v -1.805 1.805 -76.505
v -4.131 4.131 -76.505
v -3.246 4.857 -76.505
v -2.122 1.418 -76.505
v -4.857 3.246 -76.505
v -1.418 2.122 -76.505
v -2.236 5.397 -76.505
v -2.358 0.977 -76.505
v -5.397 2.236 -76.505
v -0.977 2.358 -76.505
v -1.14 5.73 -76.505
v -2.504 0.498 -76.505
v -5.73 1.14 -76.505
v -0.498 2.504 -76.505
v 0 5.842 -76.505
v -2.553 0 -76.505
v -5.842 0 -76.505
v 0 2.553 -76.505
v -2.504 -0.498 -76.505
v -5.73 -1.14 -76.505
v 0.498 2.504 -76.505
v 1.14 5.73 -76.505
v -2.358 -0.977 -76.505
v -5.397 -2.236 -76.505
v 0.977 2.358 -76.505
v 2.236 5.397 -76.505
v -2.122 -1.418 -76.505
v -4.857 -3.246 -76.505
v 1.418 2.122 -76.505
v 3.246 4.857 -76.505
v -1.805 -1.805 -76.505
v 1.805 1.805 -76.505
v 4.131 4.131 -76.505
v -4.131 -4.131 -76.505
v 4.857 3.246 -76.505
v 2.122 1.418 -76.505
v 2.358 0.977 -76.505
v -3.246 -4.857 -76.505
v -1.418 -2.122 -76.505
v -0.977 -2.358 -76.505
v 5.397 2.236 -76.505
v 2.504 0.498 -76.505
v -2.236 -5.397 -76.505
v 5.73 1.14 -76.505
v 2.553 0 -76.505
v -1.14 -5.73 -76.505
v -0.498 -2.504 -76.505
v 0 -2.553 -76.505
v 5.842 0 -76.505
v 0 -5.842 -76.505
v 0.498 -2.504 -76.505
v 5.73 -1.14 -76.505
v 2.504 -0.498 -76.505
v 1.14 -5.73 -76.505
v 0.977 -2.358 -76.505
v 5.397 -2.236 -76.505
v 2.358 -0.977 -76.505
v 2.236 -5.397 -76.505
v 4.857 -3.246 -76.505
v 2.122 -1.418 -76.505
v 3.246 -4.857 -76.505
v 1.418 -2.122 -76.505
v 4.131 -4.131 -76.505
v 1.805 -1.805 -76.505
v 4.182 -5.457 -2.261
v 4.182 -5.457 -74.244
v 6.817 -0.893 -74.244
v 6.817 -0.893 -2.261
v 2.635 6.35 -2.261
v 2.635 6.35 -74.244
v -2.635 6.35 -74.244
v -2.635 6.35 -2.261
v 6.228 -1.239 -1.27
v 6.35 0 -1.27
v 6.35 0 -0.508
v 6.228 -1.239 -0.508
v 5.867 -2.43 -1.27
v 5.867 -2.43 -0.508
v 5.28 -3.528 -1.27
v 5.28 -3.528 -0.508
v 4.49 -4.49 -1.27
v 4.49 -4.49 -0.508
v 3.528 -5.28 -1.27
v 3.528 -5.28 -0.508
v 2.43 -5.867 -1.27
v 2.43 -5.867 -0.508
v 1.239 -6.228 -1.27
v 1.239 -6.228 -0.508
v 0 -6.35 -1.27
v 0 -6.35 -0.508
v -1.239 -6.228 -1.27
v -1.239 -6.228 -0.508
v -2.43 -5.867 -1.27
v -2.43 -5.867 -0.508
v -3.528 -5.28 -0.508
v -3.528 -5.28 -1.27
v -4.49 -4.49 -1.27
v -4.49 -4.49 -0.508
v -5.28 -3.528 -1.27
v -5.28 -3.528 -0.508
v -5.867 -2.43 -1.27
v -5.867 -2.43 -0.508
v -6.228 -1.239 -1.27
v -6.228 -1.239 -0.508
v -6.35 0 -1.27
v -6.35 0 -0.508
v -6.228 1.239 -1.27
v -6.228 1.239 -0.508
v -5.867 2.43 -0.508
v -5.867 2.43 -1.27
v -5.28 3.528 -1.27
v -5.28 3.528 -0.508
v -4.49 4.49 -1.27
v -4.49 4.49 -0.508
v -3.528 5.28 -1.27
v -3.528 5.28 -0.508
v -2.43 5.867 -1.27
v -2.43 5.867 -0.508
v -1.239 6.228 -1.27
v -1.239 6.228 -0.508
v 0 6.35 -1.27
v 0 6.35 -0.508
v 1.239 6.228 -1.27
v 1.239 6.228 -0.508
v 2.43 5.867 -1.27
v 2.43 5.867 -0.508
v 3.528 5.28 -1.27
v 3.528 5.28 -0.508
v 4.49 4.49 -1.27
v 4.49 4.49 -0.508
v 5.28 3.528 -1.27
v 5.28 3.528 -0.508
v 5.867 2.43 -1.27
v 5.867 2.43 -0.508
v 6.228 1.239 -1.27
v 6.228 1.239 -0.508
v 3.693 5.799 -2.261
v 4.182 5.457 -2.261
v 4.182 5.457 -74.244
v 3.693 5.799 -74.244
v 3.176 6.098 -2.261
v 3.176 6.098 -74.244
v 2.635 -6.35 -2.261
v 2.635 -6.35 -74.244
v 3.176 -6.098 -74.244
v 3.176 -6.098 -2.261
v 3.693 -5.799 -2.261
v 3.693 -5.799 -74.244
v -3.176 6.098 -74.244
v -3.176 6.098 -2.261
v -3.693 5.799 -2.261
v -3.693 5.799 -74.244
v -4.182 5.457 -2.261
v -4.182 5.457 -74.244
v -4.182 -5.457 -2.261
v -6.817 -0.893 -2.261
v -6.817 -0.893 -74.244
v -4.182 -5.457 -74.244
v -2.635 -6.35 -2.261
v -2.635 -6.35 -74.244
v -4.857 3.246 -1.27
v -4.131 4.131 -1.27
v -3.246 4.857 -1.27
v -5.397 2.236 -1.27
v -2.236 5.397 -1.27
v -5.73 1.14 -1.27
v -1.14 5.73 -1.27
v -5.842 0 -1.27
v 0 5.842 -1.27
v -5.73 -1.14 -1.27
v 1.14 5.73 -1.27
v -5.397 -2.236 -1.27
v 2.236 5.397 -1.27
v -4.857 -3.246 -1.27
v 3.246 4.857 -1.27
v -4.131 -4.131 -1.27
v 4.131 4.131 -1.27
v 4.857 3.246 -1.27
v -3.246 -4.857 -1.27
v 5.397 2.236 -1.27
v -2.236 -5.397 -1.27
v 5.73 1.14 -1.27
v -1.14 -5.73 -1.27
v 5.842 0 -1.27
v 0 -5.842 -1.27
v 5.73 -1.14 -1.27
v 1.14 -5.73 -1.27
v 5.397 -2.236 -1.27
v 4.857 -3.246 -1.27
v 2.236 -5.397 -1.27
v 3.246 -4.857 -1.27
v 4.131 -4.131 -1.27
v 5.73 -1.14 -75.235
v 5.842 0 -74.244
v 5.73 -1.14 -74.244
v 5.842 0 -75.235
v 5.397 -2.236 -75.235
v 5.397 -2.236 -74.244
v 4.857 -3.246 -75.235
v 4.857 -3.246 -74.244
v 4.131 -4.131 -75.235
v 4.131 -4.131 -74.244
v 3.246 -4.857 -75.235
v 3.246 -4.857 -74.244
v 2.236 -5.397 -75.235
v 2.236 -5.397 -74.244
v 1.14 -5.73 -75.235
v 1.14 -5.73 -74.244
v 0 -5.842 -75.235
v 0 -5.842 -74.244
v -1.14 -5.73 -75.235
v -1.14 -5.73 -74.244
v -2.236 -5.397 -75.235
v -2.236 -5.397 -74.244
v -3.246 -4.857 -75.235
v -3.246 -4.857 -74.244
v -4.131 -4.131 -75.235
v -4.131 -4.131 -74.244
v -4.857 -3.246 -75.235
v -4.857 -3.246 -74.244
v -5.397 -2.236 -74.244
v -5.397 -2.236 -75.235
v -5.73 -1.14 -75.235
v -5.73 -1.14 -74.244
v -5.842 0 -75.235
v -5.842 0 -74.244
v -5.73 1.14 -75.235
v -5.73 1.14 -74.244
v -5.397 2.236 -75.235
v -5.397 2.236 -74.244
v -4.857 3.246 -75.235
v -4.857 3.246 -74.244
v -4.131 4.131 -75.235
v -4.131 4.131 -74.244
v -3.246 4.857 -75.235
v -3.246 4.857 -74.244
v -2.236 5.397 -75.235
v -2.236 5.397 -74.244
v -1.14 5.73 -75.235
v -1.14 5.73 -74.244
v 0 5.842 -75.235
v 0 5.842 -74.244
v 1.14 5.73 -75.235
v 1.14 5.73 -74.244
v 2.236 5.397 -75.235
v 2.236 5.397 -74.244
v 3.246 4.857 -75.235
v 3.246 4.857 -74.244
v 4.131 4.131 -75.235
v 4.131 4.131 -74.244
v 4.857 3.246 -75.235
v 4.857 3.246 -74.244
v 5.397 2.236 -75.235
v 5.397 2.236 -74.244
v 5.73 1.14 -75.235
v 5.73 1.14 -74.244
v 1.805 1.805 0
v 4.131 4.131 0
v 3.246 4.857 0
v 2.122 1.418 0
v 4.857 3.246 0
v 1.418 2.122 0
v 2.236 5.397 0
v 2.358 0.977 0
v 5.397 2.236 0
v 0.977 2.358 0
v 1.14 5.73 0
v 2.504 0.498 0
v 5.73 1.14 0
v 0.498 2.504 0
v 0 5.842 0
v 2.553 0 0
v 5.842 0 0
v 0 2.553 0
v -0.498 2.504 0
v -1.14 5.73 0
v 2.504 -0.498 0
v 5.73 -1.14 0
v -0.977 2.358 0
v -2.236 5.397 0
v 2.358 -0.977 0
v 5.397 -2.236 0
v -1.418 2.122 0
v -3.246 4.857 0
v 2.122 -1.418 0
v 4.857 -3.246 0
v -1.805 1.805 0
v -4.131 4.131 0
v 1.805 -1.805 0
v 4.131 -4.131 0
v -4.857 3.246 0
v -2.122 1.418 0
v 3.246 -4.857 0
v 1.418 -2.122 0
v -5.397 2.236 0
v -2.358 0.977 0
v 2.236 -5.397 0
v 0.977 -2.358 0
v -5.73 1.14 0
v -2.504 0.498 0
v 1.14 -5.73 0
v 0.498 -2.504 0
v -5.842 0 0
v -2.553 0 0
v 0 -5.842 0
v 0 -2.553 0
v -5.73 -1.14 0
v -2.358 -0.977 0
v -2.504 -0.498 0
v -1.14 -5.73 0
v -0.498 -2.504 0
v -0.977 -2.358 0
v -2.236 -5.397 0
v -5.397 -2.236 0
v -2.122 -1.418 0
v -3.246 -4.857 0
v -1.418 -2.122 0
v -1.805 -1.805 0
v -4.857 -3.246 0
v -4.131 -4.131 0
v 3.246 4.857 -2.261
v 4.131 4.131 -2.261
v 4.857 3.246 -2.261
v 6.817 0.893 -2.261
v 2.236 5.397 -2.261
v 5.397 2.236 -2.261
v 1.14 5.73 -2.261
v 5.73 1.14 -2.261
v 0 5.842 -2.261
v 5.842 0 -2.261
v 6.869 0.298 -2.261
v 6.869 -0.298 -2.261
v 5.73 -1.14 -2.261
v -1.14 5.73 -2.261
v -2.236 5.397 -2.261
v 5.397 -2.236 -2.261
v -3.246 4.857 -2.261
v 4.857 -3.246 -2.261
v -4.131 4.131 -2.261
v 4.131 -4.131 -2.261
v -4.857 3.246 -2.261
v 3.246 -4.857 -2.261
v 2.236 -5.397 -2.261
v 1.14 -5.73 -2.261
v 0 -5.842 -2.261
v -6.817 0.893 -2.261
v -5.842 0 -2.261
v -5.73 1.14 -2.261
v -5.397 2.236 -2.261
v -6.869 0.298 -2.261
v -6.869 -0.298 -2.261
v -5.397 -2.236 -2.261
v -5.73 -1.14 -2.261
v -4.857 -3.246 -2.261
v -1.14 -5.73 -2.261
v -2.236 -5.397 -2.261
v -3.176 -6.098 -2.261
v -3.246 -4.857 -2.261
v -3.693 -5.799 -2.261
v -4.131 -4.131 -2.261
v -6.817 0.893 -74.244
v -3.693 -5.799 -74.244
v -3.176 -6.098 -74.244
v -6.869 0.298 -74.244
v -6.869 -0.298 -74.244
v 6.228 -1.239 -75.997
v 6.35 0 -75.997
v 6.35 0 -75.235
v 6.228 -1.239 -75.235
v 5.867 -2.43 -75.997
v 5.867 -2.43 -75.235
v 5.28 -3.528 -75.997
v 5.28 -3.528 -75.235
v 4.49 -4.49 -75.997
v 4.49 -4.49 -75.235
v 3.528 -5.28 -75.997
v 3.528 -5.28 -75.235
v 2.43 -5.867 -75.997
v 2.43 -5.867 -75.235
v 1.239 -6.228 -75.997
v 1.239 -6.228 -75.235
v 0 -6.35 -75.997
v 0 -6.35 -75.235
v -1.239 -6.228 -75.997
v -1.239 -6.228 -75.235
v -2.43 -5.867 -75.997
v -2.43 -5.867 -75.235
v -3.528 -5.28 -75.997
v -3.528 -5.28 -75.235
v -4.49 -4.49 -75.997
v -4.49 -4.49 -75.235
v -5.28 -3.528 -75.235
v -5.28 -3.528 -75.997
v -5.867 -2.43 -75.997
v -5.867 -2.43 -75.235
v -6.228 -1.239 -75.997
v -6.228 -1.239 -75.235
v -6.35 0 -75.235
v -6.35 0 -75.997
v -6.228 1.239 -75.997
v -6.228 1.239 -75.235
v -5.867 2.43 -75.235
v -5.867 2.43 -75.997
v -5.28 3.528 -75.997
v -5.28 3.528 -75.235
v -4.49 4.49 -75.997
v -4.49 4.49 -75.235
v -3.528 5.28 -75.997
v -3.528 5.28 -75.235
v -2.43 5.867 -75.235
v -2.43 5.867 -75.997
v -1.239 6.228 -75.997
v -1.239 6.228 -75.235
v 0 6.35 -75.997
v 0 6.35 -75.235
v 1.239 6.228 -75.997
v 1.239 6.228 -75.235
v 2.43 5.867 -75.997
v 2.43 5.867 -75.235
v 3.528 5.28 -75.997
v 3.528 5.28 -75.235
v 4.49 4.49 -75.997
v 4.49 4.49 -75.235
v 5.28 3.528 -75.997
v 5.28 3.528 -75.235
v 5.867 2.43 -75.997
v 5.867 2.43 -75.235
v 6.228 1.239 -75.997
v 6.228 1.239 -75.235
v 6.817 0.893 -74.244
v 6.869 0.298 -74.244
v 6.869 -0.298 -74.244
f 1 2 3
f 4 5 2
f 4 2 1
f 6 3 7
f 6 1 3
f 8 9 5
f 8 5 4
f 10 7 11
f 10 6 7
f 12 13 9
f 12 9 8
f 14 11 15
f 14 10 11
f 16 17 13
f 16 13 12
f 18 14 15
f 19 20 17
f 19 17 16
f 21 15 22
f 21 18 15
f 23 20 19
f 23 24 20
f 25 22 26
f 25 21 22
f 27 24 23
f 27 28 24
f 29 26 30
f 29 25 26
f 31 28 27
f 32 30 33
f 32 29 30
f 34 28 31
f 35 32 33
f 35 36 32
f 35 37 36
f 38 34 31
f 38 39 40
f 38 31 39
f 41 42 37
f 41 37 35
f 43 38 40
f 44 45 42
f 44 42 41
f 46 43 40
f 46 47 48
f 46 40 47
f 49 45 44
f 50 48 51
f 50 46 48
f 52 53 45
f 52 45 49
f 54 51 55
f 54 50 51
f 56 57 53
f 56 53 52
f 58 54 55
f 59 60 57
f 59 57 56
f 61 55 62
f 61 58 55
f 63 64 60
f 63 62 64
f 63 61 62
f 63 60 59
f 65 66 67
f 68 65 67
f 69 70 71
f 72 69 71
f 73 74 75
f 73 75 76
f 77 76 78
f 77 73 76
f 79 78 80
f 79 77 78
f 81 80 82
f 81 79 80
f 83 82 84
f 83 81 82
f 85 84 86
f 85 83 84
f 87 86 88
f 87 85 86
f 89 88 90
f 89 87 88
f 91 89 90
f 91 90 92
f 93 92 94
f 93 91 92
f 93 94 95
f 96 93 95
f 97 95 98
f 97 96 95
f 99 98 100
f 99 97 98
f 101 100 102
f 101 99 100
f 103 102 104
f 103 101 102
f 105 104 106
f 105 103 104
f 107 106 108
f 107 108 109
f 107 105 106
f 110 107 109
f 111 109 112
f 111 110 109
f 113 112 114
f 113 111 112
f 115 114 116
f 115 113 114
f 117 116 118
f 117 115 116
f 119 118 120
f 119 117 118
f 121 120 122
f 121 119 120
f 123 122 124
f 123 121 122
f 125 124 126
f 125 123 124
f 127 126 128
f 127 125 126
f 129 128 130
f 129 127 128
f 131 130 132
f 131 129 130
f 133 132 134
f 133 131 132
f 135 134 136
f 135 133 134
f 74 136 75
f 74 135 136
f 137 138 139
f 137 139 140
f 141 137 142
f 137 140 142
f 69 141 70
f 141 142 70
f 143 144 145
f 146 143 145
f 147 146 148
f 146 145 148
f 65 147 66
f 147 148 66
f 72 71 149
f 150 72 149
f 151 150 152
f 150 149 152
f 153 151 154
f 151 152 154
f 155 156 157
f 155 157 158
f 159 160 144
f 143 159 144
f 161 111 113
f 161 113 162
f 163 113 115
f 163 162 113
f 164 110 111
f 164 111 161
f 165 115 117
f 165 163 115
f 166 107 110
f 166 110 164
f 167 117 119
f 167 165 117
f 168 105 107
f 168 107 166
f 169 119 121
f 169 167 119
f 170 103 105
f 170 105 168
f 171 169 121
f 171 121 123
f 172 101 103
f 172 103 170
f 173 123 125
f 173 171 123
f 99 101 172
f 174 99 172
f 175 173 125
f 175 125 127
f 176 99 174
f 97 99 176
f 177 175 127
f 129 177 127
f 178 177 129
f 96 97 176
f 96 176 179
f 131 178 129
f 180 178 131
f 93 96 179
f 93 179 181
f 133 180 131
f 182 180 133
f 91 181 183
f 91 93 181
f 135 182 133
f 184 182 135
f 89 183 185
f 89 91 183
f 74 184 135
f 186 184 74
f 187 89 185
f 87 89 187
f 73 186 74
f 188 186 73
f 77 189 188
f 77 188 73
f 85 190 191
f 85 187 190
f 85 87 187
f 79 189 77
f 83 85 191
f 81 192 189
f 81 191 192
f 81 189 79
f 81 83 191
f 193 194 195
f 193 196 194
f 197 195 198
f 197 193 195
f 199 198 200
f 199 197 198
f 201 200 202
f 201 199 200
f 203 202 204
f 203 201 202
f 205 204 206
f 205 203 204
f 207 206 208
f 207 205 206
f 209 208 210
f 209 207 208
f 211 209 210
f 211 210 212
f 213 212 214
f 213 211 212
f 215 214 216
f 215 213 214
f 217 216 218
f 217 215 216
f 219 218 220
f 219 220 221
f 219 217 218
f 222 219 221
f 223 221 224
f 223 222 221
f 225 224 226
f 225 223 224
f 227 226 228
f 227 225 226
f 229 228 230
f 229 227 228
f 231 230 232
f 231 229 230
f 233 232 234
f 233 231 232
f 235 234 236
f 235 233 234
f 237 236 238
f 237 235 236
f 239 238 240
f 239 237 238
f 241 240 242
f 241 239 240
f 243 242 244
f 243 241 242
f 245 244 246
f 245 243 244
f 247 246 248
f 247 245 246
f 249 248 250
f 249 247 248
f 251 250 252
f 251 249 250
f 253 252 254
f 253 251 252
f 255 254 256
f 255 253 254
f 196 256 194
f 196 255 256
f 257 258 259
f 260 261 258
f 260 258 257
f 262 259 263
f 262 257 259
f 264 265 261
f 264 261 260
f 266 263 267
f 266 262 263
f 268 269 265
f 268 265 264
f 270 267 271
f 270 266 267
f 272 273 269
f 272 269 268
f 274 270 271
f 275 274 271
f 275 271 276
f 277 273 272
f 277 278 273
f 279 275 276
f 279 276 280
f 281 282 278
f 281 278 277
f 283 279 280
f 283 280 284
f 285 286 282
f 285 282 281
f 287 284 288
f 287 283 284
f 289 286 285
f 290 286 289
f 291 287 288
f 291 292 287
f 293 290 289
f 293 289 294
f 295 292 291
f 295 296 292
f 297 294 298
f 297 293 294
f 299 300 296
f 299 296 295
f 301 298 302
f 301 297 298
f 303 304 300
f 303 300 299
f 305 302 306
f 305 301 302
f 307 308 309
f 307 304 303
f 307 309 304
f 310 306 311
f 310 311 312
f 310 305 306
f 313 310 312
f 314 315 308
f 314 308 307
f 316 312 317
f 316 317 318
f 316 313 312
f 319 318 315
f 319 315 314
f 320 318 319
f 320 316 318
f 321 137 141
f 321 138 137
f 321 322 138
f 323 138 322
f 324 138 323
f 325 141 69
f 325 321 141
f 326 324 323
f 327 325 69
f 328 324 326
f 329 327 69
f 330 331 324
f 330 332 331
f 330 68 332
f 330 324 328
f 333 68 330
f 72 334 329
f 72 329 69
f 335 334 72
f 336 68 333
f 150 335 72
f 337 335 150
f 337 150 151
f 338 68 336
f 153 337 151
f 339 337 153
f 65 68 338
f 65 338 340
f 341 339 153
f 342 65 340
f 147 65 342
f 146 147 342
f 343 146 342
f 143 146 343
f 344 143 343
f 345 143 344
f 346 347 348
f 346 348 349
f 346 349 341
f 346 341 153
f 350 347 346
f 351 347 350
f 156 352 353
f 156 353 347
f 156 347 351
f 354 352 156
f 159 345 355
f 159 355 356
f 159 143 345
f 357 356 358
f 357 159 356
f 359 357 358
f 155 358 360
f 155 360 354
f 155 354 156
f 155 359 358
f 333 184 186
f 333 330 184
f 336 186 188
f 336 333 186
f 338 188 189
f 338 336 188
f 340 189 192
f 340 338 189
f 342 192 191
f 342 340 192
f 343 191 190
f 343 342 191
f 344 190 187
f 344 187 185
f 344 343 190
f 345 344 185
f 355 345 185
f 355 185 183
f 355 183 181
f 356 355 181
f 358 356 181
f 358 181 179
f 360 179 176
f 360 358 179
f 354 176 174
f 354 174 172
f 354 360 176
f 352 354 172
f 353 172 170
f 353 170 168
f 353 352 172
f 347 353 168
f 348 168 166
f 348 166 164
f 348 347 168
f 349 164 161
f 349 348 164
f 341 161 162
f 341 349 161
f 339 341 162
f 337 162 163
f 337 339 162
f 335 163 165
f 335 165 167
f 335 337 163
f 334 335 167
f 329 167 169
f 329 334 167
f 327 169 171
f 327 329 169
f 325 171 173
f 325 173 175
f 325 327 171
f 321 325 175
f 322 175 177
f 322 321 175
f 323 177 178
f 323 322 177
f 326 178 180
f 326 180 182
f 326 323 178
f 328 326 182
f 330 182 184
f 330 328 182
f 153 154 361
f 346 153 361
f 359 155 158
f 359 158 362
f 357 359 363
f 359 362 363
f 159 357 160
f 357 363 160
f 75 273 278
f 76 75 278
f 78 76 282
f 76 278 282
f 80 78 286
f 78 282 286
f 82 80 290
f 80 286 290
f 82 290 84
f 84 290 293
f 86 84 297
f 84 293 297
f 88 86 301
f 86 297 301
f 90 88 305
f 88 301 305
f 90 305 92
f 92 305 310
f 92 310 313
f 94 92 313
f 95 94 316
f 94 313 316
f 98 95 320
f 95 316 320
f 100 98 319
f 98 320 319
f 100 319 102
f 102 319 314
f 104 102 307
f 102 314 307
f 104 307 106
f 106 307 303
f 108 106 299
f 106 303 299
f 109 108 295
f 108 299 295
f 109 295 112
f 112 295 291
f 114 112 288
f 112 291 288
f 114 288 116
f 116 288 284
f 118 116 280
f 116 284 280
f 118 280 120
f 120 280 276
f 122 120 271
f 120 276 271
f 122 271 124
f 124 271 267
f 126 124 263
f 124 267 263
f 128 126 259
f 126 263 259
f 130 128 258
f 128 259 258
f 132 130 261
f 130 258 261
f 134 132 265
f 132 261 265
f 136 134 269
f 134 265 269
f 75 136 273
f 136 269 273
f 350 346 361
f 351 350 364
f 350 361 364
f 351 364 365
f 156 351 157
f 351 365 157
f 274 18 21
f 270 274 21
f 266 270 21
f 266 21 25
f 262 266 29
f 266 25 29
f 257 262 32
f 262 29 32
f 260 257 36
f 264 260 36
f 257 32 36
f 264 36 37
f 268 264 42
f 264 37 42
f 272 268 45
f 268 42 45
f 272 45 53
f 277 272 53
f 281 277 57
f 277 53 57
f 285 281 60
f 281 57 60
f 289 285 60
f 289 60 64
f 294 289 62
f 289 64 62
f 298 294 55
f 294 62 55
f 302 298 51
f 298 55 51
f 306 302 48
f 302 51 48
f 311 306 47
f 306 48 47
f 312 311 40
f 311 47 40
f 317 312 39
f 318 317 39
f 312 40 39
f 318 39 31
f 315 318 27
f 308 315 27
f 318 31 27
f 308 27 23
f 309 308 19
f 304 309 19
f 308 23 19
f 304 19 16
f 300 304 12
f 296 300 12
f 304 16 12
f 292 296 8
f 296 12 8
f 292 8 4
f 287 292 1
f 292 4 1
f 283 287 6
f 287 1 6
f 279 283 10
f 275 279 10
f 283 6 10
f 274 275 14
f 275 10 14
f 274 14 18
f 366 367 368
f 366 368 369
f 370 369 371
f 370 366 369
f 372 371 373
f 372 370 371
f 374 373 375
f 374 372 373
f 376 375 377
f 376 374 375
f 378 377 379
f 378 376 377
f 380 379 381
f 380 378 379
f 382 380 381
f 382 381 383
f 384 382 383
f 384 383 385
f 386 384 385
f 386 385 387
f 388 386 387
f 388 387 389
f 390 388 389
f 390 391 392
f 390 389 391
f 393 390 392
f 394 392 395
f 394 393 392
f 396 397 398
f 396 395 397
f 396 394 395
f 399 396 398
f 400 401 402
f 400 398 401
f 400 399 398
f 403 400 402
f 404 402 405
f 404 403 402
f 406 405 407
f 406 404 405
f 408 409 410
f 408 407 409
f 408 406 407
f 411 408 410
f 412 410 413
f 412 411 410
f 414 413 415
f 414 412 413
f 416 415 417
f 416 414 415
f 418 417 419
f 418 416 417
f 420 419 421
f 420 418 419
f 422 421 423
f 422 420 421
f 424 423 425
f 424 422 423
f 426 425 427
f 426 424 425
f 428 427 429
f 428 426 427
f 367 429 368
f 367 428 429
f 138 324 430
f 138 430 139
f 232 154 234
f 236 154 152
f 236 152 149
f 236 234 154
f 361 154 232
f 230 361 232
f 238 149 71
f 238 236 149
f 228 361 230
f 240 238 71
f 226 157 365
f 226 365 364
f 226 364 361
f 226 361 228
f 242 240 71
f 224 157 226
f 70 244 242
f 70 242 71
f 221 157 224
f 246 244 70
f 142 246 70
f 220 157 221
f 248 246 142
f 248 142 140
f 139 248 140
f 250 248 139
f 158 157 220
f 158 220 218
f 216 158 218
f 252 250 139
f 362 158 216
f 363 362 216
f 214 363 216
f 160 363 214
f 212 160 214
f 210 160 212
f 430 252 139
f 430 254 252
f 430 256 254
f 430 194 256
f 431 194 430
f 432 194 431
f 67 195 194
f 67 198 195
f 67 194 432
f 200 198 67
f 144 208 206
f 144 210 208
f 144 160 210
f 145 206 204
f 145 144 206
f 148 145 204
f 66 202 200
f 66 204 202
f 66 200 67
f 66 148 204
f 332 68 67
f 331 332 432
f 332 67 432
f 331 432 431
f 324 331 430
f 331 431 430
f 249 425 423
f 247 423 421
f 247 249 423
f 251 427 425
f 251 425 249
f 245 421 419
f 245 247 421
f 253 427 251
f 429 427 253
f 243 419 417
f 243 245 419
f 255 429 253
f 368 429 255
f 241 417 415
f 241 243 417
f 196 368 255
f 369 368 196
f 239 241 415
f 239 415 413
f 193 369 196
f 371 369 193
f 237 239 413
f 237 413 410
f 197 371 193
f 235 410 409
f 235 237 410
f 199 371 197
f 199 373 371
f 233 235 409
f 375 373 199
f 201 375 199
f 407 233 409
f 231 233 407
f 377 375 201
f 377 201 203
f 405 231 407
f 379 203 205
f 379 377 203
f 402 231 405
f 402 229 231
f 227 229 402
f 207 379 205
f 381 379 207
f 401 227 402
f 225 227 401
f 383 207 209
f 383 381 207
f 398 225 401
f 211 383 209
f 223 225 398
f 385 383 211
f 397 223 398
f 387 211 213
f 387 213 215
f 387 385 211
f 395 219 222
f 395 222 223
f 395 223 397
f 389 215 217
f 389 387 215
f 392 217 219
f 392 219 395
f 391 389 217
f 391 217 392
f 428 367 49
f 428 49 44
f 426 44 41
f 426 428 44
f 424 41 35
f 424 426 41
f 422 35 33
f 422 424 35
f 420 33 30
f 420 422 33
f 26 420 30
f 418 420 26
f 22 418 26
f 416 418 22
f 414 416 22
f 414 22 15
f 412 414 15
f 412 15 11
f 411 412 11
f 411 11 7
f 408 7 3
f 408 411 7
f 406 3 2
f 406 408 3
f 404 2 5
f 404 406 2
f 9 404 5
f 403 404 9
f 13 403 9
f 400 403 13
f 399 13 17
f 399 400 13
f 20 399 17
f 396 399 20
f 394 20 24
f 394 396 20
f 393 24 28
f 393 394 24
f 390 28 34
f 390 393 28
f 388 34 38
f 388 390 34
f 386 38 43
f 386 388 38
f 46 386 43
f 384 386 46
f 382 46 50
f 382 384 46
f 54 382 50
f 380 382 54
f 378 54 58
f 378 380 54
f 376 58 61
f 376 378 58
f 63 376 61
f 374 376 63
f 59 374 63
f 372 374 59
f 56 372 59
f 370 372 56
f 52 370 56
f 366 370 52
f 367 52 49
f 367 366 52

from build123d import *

# Parameters (mm, degrees)
CUT_EXTRUDE1_START = -76.5048
SKETCH3_R          = 7.62
CUT_EXTRUDE1_DEPTH = 76.5048
SKETCH4_R          = 2.5527
CUT_EXTRUDE2_DEPTH = 76.5048
CHAMFER1_SIZE      = 0.508


with BuildPart() as part:
    # Sketch2 → Revolve1 (revolve)
    with BuildSketch(Plane(origin=(0, 0, 0), x_dir=(0, 0, -1), z_dir=(1, 0, 0)), mode=Mode.PRIVATE) as revolve1_sk:
        Polygon((1.27, 6.35), (1.27, 5.842), (2.2606, 5.842), (2.2606, 7.62), (74.2442, 7.62), (74.2442, 5.842), (75.2348, 5.842), (75.2348, 6.35), (76.5048, 6.35), (76.5048, 0), (0, 0), (0, 6.35), align=None)
    revolve(revolve1_sk.sketch.rotate(Axis((0, 0, 0), (0, 0, -1)), 90), axis=Axis((0, 0, 0), (0, 0, -1)))

    # Sketch3 → Cut-Extrude1 (cut)
    with BuildSketch(Plane.XY.offset(CUT_EXTRUDE1_START)):
        Circle(SKETCH3_R)
        with BuildLine():
            Line((6.816751826, 0.893039494), (4.181770802, 5.456960506))
            ThreePointArc((4.181770802, 5.456960506), (3.4375, 5.953924651), (2.634981025, 6.35))
            Line((2.634981025, 6.35), (-2.634981025, 6.35))
            ThreePointArc((-2.634981025, 6.35), (-3.4375, 5.953924651), (-4.181770802, 5.456960506))
            Line((-4.181770802, 5.456960506), (-6.816751826, 0.893039494))
            ThreePointArc((-6.816751826, 0.893039494), (-6.875, 0), (-6.816751826, -0.893039494))
            Line((-6.816751826, -0.893039494), (-4.181770802, -5.456960506))
            ThreePointArc((-4.181770802, -5.456960506), (-3.4375, -5.953924651), (-2.634981025, -6.35))
            Line((-2.634981025, -6.35), (2.634981025, -6.35))
            ThreePointArc((2.634981025, -6.35), (3.4375, -5.953924651), (4.181770802, -5.456960506))
            Line((4.181770802, -5.456960506), (6.816751826, -0.893039494))
            ThreePointArc((6.816751826, -0.893039494), (6.875, 0), (6.816751826, 0.893039494))
        make_face(mode=Mode.SUBTRACT)
    extrude(amount=CUT_EXTRUDE1_DEPTH, mode=Mode.SUBTRACT)

    # Sketch4 → Cut-Extrude2 (cut)
    with BuildSketch(Plane(origin=(0, 0, -76.5048), x_dir=(-1, 0, 0), z_dir=(0, 0, -1))):
        with Locations(Location((0, 0, 0), (0, 0, 90))):
            Circle(SKETCH4_R)
    extrude(amount=-CUT_EXTRUDE2_DEPTH, mode=Mode.SUBTRACT)

    # Chamfer1
    chamfer1_edges = [part.edges().sort_by_distance(p)[0] for p in [
        (-6.35, 0, 0),
        (-6.35, 0, -76.5048),
    ]]
    chamfer(chamfer1_edges, length=CHAMFER1_SIZE)


solid = part.part
